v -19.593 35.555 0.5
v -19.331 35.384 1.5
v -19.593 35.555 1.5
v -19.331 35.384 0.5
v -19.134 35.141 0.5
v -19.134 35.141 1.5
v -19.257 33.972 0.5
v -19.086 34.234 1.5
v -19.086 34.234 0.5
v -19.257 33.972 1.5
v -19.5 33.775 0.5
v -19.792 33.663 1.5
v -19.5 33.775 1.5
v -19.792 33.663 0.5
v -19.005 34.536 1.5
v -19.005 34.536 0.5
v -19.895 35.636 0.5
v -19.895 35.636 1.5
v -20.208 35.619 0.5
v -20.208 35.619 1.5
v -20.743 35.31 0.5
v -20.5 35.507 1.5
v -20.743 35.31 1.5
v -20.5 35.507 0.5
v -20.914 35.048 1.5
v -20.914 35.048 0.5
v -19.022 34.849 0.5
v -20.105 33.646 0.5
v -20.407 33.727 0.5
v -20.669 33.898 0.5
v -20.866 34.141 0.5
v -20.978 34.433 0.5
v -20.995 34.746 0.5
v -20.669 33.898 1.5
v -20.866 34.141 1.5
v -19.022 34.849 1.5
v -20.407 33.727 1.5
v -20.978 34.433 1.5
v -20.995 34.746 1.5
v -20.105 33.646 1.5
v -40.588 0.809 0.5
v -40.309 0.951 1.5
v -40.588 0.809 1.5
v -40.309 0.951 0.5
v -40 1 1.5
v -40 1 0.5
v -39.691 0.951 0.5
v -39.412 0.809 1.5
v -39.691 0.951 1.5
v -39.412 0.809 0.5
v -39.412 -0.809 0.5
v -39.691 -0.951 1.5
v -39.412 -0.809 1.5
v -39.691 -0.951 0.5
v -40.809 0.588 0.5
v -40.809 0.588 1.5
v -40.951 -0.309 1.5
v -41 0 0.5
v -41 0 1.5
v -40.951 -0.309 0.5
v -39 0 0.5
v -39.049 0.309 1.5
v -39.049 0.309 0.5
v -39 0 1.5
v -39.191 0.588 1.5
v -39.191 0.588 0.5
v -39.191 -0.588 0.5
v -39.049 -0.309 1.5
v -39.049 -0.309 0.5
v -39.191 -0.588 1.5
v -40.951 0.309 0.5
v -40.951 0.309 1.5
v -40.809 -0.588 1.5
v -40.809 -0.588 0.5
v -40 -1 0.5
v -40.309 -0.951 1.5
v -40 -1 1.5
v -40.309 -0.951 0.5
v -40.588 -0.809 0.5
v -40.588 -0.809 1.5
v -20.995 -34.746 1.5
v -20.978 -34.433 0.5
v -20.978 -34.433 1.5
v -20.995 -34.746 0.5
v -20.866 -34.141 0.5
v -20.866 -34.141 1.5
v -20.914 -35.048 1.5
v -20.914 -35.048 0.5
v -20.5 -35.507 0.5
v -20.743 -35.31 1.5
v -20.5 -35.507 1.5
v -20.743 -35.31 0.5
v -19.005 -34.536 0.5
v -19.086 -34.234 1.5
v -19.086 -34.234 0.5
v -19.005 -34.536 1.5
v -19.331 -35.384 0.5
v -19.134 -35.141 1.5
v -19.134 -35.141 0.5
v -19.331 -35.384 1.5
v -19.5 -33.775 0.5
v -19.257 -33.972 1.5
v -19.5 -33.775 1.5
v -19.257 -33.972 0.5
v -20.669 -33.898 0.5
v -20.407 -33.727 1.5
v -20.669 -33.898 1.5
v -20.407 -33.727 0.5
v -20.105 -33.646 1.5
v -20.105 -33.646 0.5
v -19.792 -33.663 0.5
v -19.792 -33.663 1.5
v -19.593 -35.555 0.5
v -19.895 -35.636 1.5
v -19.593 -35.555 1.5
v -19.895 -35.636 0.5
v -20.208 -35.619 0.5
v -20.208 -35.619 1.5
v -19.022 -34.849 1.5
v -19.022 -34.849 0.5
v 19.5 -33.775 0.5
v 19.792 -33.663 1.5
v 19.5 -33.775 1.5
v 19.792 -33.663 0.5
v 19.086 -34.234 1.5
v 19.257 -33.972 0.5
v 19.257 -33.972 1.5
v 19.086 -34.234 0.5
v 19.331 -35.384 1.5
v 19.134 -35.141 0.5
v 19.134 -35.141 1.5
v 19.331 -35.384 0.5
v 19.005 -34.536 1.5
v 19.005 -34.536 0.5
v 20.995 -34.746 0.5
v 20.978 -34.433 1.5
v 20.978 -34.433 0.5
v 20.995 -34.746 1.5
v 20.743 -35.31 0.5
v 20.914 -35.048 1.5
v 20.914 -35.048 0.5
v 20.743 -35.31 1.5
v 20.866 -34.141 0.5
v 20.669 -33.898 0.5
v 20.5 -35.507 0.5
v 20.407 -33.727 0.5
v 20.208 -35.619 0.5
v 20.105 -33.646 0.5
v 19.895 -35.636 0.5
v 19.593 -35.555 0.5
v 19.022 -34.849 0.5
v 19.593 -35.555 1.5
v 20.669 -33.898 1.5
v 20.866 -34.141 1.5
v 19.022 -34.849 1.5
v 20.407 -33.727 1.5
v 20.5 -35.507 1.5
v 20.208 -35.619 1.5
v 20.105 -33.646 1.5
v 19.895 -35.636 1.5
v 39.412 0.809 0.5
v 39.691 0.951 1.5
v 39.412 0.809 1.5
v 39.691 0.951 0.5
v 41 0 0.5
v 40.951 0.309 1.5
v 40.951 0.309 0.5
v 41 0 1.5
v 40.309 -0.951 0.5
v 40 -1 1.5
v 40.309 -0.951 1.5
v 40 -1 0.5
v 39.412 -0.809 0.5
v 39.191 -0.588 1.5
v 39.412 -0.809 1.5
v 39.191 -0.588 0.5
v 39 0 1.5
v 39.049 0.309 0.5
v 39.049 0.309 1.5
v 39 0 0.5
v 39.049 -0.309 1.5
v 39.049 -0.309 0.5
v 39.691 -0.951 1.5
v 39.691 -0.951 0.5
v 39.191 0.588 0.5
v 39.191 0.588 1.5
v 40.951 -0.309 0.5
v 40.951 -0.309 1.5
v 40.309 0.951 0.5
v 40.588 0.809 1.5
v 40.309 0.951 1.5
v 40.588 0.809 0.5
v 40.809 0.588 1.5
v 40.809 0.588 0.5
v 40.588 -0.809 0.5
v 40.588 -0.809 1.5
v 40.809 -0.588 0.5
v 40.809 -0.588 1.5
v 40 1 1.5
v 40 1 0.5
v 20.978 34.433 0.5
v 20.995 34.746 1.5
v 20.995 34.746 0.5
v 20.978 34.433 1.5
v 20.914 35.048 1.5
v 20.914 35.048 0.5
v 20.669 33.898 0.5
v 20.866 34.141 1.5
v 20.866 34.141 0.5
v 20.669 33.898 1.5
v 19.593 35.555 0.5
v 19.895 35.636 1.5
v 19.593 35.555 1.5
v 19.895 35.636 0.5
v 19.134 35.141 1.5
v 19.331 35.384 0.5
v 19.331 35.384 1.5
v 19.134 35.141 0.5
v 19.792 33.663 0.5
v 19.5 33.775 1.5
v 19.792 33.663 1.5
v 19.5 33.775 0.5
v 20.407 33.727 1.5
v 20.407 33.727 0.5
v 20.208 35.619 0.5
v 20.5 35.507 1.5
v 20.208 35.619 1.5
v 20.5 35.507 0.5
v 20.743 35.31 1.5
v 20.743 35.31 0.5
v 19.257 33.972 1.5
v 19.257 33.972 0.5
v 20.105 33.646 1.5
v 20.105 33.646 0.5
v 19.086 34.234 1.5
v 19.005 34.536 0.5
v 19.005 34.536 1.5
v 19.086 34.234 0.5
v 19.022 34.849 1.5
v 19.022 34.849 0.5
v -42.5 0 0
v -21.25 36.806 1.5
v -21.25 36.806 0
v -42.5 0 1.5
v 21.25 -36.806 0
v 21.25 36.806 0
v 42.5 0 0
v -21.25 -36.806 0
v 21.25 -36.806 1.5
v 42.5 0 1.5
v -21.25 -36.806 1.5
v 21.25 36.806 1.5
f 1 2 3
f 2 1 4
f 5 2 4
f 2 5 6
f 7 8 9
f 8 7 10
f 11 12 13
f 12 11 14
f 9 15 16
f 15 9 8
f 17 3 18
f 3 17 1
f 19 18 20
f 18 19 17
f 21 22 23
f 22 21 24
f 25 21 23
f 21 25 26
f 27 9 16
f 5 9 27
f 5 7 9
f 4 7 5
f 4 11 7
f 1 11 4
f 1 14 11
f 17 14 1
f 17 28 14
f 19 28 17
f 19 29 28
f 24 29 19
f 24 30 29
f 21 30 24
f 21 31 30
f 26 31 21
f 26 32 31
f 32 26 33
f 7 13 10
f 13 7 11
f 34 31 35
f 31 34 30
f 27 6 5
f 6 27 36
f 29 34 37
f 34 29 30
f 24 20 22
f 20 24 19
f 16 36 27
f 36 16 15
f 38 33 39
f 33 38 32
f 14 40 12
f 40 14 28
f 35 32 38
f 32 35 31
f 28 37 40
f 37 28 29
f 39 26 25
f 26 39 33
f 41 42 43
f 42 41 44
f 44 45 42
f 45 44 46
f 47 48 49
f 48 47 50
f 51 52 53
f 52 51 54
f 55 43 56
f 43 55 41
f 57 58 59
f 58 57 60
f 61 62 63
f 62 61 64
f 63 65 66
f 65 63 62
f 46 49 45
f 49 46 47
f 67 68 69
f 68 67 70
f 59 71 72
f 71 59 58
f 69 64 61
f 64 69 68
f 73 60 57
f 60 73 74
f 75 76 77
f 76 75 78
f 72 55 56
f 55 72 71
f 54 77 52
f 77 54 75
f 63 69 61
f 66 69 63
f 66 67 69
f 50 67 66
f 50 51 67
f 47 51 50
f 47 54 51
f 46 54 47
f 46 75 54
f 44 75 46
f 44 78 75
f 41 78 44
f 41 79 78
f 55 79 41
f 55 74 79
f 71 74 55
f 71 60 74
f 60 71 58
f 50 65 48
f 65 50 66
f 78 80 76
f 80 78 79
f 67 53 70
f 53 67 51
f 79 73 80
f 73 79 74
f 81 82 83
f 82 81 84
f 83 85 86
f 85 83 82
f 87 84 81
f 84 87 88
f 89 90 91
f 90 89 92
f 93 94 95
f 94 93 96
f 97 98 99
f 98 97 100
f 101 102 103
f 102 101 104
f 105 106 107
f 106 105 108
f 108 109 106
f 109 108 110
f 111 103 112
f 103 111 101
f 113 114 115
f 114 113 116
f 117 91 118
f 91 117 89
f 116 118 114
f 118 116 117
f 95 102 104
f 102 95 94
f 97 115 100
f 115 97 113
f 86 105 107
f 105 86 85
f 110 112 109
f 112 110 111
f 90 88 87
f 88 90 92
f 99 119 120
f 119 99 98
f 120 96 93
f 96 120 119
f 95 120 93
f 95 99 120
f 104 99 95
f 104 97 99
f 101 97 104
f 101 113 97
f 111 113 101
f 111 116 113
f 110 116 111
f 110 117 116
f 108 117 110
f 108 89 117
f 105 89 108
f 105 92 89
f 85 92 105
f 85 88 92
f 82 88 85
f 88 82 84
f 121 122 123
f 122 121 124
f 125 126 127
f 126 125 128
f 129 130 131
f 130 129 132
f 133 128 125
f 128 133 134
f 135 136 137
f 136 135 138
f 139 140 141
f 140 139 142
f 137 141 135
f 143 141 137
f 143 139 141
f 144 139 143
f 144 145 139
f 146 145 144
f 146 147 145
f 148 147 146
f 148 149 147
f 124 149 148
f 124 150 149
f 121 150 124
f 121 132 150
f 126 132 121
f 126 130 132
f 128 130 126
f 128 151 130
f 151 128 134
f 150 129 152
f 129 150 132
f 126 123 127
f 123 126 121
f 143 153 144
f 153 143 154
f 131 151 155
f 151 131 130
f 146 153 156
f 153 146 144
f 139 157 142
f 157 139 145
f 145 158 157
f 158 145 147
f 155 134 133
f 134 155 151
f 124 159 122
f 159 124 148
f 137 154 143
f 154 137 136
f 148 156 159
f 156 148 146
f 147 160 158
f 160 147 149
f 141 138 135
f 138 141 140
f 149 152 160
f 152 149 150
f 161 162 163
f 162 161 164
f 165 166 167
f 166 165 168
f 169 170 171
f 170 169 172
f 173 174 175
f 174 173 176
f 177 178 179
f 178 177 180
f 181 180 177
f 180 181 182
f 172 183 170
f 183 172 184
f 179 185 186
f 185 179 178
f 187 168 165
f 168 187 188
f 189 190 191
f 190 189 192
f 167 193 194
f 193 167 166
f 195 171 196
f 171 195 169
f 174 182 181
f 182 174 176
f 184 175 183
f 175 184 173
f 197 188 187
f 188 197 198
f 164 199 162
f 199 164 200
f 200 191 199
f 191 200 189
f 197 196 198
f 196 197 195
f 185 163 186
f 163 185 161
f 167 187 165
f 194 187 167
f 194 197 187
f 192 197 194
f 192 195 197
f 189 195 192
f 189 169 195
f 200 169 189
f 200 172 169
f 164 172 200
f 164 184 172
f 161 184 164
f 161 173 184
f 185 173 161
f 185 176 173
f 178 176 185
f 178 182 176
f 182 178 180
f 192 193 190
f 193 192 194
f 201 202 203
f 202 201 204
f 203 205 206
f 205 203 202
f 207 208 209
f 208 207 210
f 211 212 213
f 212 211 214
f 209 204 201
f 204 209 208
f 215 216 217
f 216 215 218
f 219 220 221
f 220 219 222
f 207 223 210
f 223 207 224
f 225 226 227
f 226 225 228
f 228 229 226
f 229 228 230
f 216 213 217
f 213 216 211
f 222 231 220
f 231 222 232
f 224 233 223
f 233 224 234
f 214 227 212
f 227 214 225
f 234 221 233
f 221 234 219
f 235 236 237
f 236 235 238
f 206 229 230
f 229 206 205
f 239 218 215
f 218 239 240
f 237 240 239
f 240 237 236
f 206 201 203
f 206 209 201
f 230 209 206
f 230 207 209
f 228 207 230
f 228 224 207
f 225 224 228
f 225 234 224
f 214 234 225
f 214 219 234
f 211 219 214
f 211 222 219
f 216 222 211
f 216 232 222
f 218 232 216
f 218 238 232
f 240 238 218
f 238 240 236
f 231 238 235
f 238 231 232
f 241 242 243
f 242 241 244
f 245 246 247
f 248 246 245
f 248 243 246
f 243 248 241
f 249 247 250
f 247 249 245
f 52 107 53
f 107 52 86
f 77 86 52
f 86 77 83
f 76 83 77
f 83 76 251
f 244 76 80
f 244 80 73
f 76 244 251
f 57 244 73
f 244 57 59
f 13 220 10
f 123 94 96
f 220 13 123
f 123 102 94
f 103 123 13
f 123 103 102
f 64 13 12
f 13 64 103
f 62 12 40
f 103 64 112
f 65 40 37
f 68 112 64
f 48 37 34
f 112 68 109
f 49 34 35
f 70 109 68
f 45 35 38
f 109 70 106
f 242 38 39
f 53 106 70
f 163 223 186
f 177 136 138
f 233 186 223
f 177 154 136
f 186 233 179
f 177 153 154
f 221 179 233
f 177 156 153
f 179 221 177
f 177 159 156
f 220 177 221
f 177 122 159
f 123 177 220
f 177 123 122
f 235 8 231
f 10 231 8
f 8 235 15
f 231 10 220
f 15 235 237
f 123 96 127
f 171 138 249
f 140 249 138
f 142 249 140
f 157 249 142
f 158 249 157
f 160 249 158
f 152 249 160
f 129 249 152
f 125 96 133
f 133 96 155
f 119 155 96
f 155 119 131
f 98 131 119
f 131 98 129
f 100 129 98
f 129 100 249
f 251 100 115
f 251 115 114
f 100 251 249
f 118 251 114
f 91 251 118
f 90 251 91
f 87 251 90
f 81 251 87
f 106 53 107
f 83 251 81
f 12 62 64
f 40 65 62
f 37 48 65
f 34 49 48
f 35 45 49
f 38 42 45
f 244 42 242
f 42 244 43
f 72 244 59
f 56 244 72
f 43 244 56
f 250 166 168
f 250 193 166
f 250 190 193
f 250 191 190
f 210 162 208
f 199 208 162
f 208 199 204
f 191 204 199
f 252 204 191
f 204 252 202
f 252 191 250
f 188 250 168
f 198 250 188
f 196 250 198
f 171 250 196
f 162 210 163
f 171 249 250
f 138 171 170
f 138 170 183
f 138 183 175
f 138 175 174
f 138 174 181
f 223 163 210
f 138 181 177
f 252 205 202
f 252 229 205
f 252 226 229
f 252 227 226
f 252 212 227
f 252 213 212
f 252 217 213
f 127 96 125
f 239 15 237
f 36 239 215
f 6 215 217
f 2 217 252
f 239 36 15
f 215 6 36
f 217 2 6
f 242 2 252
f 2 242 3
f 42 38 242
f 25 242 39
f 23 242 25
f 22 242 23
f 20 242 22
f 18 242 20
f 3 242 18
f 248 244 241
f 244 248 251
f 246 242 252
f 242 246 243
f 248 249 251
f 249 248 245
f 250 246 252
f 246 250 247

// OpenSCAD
//
//translate([0,0,1.5])
//color("red"){
//    linear_extrude(1.5)
//    difference(){
//    circle(d=85,$fn=6);
//    circle(d=80,$fn=6);
//    }
//    for (i=[0:5])
//    rotate([0,0,30+i*60])
//        translate([0,40,-1])
//            cylinder(h=2,r=1,$fn=20);
//} 
color("blue",.5)
difference(){    
linear_extrude(1.5)
    circle(d=85,$fn=6);
    for (i=[0:5])
    rotate([0,0,30+i*60])
        translate([0,40,.5])
            cylinder(h=2,r=1,$fn=20);
}
